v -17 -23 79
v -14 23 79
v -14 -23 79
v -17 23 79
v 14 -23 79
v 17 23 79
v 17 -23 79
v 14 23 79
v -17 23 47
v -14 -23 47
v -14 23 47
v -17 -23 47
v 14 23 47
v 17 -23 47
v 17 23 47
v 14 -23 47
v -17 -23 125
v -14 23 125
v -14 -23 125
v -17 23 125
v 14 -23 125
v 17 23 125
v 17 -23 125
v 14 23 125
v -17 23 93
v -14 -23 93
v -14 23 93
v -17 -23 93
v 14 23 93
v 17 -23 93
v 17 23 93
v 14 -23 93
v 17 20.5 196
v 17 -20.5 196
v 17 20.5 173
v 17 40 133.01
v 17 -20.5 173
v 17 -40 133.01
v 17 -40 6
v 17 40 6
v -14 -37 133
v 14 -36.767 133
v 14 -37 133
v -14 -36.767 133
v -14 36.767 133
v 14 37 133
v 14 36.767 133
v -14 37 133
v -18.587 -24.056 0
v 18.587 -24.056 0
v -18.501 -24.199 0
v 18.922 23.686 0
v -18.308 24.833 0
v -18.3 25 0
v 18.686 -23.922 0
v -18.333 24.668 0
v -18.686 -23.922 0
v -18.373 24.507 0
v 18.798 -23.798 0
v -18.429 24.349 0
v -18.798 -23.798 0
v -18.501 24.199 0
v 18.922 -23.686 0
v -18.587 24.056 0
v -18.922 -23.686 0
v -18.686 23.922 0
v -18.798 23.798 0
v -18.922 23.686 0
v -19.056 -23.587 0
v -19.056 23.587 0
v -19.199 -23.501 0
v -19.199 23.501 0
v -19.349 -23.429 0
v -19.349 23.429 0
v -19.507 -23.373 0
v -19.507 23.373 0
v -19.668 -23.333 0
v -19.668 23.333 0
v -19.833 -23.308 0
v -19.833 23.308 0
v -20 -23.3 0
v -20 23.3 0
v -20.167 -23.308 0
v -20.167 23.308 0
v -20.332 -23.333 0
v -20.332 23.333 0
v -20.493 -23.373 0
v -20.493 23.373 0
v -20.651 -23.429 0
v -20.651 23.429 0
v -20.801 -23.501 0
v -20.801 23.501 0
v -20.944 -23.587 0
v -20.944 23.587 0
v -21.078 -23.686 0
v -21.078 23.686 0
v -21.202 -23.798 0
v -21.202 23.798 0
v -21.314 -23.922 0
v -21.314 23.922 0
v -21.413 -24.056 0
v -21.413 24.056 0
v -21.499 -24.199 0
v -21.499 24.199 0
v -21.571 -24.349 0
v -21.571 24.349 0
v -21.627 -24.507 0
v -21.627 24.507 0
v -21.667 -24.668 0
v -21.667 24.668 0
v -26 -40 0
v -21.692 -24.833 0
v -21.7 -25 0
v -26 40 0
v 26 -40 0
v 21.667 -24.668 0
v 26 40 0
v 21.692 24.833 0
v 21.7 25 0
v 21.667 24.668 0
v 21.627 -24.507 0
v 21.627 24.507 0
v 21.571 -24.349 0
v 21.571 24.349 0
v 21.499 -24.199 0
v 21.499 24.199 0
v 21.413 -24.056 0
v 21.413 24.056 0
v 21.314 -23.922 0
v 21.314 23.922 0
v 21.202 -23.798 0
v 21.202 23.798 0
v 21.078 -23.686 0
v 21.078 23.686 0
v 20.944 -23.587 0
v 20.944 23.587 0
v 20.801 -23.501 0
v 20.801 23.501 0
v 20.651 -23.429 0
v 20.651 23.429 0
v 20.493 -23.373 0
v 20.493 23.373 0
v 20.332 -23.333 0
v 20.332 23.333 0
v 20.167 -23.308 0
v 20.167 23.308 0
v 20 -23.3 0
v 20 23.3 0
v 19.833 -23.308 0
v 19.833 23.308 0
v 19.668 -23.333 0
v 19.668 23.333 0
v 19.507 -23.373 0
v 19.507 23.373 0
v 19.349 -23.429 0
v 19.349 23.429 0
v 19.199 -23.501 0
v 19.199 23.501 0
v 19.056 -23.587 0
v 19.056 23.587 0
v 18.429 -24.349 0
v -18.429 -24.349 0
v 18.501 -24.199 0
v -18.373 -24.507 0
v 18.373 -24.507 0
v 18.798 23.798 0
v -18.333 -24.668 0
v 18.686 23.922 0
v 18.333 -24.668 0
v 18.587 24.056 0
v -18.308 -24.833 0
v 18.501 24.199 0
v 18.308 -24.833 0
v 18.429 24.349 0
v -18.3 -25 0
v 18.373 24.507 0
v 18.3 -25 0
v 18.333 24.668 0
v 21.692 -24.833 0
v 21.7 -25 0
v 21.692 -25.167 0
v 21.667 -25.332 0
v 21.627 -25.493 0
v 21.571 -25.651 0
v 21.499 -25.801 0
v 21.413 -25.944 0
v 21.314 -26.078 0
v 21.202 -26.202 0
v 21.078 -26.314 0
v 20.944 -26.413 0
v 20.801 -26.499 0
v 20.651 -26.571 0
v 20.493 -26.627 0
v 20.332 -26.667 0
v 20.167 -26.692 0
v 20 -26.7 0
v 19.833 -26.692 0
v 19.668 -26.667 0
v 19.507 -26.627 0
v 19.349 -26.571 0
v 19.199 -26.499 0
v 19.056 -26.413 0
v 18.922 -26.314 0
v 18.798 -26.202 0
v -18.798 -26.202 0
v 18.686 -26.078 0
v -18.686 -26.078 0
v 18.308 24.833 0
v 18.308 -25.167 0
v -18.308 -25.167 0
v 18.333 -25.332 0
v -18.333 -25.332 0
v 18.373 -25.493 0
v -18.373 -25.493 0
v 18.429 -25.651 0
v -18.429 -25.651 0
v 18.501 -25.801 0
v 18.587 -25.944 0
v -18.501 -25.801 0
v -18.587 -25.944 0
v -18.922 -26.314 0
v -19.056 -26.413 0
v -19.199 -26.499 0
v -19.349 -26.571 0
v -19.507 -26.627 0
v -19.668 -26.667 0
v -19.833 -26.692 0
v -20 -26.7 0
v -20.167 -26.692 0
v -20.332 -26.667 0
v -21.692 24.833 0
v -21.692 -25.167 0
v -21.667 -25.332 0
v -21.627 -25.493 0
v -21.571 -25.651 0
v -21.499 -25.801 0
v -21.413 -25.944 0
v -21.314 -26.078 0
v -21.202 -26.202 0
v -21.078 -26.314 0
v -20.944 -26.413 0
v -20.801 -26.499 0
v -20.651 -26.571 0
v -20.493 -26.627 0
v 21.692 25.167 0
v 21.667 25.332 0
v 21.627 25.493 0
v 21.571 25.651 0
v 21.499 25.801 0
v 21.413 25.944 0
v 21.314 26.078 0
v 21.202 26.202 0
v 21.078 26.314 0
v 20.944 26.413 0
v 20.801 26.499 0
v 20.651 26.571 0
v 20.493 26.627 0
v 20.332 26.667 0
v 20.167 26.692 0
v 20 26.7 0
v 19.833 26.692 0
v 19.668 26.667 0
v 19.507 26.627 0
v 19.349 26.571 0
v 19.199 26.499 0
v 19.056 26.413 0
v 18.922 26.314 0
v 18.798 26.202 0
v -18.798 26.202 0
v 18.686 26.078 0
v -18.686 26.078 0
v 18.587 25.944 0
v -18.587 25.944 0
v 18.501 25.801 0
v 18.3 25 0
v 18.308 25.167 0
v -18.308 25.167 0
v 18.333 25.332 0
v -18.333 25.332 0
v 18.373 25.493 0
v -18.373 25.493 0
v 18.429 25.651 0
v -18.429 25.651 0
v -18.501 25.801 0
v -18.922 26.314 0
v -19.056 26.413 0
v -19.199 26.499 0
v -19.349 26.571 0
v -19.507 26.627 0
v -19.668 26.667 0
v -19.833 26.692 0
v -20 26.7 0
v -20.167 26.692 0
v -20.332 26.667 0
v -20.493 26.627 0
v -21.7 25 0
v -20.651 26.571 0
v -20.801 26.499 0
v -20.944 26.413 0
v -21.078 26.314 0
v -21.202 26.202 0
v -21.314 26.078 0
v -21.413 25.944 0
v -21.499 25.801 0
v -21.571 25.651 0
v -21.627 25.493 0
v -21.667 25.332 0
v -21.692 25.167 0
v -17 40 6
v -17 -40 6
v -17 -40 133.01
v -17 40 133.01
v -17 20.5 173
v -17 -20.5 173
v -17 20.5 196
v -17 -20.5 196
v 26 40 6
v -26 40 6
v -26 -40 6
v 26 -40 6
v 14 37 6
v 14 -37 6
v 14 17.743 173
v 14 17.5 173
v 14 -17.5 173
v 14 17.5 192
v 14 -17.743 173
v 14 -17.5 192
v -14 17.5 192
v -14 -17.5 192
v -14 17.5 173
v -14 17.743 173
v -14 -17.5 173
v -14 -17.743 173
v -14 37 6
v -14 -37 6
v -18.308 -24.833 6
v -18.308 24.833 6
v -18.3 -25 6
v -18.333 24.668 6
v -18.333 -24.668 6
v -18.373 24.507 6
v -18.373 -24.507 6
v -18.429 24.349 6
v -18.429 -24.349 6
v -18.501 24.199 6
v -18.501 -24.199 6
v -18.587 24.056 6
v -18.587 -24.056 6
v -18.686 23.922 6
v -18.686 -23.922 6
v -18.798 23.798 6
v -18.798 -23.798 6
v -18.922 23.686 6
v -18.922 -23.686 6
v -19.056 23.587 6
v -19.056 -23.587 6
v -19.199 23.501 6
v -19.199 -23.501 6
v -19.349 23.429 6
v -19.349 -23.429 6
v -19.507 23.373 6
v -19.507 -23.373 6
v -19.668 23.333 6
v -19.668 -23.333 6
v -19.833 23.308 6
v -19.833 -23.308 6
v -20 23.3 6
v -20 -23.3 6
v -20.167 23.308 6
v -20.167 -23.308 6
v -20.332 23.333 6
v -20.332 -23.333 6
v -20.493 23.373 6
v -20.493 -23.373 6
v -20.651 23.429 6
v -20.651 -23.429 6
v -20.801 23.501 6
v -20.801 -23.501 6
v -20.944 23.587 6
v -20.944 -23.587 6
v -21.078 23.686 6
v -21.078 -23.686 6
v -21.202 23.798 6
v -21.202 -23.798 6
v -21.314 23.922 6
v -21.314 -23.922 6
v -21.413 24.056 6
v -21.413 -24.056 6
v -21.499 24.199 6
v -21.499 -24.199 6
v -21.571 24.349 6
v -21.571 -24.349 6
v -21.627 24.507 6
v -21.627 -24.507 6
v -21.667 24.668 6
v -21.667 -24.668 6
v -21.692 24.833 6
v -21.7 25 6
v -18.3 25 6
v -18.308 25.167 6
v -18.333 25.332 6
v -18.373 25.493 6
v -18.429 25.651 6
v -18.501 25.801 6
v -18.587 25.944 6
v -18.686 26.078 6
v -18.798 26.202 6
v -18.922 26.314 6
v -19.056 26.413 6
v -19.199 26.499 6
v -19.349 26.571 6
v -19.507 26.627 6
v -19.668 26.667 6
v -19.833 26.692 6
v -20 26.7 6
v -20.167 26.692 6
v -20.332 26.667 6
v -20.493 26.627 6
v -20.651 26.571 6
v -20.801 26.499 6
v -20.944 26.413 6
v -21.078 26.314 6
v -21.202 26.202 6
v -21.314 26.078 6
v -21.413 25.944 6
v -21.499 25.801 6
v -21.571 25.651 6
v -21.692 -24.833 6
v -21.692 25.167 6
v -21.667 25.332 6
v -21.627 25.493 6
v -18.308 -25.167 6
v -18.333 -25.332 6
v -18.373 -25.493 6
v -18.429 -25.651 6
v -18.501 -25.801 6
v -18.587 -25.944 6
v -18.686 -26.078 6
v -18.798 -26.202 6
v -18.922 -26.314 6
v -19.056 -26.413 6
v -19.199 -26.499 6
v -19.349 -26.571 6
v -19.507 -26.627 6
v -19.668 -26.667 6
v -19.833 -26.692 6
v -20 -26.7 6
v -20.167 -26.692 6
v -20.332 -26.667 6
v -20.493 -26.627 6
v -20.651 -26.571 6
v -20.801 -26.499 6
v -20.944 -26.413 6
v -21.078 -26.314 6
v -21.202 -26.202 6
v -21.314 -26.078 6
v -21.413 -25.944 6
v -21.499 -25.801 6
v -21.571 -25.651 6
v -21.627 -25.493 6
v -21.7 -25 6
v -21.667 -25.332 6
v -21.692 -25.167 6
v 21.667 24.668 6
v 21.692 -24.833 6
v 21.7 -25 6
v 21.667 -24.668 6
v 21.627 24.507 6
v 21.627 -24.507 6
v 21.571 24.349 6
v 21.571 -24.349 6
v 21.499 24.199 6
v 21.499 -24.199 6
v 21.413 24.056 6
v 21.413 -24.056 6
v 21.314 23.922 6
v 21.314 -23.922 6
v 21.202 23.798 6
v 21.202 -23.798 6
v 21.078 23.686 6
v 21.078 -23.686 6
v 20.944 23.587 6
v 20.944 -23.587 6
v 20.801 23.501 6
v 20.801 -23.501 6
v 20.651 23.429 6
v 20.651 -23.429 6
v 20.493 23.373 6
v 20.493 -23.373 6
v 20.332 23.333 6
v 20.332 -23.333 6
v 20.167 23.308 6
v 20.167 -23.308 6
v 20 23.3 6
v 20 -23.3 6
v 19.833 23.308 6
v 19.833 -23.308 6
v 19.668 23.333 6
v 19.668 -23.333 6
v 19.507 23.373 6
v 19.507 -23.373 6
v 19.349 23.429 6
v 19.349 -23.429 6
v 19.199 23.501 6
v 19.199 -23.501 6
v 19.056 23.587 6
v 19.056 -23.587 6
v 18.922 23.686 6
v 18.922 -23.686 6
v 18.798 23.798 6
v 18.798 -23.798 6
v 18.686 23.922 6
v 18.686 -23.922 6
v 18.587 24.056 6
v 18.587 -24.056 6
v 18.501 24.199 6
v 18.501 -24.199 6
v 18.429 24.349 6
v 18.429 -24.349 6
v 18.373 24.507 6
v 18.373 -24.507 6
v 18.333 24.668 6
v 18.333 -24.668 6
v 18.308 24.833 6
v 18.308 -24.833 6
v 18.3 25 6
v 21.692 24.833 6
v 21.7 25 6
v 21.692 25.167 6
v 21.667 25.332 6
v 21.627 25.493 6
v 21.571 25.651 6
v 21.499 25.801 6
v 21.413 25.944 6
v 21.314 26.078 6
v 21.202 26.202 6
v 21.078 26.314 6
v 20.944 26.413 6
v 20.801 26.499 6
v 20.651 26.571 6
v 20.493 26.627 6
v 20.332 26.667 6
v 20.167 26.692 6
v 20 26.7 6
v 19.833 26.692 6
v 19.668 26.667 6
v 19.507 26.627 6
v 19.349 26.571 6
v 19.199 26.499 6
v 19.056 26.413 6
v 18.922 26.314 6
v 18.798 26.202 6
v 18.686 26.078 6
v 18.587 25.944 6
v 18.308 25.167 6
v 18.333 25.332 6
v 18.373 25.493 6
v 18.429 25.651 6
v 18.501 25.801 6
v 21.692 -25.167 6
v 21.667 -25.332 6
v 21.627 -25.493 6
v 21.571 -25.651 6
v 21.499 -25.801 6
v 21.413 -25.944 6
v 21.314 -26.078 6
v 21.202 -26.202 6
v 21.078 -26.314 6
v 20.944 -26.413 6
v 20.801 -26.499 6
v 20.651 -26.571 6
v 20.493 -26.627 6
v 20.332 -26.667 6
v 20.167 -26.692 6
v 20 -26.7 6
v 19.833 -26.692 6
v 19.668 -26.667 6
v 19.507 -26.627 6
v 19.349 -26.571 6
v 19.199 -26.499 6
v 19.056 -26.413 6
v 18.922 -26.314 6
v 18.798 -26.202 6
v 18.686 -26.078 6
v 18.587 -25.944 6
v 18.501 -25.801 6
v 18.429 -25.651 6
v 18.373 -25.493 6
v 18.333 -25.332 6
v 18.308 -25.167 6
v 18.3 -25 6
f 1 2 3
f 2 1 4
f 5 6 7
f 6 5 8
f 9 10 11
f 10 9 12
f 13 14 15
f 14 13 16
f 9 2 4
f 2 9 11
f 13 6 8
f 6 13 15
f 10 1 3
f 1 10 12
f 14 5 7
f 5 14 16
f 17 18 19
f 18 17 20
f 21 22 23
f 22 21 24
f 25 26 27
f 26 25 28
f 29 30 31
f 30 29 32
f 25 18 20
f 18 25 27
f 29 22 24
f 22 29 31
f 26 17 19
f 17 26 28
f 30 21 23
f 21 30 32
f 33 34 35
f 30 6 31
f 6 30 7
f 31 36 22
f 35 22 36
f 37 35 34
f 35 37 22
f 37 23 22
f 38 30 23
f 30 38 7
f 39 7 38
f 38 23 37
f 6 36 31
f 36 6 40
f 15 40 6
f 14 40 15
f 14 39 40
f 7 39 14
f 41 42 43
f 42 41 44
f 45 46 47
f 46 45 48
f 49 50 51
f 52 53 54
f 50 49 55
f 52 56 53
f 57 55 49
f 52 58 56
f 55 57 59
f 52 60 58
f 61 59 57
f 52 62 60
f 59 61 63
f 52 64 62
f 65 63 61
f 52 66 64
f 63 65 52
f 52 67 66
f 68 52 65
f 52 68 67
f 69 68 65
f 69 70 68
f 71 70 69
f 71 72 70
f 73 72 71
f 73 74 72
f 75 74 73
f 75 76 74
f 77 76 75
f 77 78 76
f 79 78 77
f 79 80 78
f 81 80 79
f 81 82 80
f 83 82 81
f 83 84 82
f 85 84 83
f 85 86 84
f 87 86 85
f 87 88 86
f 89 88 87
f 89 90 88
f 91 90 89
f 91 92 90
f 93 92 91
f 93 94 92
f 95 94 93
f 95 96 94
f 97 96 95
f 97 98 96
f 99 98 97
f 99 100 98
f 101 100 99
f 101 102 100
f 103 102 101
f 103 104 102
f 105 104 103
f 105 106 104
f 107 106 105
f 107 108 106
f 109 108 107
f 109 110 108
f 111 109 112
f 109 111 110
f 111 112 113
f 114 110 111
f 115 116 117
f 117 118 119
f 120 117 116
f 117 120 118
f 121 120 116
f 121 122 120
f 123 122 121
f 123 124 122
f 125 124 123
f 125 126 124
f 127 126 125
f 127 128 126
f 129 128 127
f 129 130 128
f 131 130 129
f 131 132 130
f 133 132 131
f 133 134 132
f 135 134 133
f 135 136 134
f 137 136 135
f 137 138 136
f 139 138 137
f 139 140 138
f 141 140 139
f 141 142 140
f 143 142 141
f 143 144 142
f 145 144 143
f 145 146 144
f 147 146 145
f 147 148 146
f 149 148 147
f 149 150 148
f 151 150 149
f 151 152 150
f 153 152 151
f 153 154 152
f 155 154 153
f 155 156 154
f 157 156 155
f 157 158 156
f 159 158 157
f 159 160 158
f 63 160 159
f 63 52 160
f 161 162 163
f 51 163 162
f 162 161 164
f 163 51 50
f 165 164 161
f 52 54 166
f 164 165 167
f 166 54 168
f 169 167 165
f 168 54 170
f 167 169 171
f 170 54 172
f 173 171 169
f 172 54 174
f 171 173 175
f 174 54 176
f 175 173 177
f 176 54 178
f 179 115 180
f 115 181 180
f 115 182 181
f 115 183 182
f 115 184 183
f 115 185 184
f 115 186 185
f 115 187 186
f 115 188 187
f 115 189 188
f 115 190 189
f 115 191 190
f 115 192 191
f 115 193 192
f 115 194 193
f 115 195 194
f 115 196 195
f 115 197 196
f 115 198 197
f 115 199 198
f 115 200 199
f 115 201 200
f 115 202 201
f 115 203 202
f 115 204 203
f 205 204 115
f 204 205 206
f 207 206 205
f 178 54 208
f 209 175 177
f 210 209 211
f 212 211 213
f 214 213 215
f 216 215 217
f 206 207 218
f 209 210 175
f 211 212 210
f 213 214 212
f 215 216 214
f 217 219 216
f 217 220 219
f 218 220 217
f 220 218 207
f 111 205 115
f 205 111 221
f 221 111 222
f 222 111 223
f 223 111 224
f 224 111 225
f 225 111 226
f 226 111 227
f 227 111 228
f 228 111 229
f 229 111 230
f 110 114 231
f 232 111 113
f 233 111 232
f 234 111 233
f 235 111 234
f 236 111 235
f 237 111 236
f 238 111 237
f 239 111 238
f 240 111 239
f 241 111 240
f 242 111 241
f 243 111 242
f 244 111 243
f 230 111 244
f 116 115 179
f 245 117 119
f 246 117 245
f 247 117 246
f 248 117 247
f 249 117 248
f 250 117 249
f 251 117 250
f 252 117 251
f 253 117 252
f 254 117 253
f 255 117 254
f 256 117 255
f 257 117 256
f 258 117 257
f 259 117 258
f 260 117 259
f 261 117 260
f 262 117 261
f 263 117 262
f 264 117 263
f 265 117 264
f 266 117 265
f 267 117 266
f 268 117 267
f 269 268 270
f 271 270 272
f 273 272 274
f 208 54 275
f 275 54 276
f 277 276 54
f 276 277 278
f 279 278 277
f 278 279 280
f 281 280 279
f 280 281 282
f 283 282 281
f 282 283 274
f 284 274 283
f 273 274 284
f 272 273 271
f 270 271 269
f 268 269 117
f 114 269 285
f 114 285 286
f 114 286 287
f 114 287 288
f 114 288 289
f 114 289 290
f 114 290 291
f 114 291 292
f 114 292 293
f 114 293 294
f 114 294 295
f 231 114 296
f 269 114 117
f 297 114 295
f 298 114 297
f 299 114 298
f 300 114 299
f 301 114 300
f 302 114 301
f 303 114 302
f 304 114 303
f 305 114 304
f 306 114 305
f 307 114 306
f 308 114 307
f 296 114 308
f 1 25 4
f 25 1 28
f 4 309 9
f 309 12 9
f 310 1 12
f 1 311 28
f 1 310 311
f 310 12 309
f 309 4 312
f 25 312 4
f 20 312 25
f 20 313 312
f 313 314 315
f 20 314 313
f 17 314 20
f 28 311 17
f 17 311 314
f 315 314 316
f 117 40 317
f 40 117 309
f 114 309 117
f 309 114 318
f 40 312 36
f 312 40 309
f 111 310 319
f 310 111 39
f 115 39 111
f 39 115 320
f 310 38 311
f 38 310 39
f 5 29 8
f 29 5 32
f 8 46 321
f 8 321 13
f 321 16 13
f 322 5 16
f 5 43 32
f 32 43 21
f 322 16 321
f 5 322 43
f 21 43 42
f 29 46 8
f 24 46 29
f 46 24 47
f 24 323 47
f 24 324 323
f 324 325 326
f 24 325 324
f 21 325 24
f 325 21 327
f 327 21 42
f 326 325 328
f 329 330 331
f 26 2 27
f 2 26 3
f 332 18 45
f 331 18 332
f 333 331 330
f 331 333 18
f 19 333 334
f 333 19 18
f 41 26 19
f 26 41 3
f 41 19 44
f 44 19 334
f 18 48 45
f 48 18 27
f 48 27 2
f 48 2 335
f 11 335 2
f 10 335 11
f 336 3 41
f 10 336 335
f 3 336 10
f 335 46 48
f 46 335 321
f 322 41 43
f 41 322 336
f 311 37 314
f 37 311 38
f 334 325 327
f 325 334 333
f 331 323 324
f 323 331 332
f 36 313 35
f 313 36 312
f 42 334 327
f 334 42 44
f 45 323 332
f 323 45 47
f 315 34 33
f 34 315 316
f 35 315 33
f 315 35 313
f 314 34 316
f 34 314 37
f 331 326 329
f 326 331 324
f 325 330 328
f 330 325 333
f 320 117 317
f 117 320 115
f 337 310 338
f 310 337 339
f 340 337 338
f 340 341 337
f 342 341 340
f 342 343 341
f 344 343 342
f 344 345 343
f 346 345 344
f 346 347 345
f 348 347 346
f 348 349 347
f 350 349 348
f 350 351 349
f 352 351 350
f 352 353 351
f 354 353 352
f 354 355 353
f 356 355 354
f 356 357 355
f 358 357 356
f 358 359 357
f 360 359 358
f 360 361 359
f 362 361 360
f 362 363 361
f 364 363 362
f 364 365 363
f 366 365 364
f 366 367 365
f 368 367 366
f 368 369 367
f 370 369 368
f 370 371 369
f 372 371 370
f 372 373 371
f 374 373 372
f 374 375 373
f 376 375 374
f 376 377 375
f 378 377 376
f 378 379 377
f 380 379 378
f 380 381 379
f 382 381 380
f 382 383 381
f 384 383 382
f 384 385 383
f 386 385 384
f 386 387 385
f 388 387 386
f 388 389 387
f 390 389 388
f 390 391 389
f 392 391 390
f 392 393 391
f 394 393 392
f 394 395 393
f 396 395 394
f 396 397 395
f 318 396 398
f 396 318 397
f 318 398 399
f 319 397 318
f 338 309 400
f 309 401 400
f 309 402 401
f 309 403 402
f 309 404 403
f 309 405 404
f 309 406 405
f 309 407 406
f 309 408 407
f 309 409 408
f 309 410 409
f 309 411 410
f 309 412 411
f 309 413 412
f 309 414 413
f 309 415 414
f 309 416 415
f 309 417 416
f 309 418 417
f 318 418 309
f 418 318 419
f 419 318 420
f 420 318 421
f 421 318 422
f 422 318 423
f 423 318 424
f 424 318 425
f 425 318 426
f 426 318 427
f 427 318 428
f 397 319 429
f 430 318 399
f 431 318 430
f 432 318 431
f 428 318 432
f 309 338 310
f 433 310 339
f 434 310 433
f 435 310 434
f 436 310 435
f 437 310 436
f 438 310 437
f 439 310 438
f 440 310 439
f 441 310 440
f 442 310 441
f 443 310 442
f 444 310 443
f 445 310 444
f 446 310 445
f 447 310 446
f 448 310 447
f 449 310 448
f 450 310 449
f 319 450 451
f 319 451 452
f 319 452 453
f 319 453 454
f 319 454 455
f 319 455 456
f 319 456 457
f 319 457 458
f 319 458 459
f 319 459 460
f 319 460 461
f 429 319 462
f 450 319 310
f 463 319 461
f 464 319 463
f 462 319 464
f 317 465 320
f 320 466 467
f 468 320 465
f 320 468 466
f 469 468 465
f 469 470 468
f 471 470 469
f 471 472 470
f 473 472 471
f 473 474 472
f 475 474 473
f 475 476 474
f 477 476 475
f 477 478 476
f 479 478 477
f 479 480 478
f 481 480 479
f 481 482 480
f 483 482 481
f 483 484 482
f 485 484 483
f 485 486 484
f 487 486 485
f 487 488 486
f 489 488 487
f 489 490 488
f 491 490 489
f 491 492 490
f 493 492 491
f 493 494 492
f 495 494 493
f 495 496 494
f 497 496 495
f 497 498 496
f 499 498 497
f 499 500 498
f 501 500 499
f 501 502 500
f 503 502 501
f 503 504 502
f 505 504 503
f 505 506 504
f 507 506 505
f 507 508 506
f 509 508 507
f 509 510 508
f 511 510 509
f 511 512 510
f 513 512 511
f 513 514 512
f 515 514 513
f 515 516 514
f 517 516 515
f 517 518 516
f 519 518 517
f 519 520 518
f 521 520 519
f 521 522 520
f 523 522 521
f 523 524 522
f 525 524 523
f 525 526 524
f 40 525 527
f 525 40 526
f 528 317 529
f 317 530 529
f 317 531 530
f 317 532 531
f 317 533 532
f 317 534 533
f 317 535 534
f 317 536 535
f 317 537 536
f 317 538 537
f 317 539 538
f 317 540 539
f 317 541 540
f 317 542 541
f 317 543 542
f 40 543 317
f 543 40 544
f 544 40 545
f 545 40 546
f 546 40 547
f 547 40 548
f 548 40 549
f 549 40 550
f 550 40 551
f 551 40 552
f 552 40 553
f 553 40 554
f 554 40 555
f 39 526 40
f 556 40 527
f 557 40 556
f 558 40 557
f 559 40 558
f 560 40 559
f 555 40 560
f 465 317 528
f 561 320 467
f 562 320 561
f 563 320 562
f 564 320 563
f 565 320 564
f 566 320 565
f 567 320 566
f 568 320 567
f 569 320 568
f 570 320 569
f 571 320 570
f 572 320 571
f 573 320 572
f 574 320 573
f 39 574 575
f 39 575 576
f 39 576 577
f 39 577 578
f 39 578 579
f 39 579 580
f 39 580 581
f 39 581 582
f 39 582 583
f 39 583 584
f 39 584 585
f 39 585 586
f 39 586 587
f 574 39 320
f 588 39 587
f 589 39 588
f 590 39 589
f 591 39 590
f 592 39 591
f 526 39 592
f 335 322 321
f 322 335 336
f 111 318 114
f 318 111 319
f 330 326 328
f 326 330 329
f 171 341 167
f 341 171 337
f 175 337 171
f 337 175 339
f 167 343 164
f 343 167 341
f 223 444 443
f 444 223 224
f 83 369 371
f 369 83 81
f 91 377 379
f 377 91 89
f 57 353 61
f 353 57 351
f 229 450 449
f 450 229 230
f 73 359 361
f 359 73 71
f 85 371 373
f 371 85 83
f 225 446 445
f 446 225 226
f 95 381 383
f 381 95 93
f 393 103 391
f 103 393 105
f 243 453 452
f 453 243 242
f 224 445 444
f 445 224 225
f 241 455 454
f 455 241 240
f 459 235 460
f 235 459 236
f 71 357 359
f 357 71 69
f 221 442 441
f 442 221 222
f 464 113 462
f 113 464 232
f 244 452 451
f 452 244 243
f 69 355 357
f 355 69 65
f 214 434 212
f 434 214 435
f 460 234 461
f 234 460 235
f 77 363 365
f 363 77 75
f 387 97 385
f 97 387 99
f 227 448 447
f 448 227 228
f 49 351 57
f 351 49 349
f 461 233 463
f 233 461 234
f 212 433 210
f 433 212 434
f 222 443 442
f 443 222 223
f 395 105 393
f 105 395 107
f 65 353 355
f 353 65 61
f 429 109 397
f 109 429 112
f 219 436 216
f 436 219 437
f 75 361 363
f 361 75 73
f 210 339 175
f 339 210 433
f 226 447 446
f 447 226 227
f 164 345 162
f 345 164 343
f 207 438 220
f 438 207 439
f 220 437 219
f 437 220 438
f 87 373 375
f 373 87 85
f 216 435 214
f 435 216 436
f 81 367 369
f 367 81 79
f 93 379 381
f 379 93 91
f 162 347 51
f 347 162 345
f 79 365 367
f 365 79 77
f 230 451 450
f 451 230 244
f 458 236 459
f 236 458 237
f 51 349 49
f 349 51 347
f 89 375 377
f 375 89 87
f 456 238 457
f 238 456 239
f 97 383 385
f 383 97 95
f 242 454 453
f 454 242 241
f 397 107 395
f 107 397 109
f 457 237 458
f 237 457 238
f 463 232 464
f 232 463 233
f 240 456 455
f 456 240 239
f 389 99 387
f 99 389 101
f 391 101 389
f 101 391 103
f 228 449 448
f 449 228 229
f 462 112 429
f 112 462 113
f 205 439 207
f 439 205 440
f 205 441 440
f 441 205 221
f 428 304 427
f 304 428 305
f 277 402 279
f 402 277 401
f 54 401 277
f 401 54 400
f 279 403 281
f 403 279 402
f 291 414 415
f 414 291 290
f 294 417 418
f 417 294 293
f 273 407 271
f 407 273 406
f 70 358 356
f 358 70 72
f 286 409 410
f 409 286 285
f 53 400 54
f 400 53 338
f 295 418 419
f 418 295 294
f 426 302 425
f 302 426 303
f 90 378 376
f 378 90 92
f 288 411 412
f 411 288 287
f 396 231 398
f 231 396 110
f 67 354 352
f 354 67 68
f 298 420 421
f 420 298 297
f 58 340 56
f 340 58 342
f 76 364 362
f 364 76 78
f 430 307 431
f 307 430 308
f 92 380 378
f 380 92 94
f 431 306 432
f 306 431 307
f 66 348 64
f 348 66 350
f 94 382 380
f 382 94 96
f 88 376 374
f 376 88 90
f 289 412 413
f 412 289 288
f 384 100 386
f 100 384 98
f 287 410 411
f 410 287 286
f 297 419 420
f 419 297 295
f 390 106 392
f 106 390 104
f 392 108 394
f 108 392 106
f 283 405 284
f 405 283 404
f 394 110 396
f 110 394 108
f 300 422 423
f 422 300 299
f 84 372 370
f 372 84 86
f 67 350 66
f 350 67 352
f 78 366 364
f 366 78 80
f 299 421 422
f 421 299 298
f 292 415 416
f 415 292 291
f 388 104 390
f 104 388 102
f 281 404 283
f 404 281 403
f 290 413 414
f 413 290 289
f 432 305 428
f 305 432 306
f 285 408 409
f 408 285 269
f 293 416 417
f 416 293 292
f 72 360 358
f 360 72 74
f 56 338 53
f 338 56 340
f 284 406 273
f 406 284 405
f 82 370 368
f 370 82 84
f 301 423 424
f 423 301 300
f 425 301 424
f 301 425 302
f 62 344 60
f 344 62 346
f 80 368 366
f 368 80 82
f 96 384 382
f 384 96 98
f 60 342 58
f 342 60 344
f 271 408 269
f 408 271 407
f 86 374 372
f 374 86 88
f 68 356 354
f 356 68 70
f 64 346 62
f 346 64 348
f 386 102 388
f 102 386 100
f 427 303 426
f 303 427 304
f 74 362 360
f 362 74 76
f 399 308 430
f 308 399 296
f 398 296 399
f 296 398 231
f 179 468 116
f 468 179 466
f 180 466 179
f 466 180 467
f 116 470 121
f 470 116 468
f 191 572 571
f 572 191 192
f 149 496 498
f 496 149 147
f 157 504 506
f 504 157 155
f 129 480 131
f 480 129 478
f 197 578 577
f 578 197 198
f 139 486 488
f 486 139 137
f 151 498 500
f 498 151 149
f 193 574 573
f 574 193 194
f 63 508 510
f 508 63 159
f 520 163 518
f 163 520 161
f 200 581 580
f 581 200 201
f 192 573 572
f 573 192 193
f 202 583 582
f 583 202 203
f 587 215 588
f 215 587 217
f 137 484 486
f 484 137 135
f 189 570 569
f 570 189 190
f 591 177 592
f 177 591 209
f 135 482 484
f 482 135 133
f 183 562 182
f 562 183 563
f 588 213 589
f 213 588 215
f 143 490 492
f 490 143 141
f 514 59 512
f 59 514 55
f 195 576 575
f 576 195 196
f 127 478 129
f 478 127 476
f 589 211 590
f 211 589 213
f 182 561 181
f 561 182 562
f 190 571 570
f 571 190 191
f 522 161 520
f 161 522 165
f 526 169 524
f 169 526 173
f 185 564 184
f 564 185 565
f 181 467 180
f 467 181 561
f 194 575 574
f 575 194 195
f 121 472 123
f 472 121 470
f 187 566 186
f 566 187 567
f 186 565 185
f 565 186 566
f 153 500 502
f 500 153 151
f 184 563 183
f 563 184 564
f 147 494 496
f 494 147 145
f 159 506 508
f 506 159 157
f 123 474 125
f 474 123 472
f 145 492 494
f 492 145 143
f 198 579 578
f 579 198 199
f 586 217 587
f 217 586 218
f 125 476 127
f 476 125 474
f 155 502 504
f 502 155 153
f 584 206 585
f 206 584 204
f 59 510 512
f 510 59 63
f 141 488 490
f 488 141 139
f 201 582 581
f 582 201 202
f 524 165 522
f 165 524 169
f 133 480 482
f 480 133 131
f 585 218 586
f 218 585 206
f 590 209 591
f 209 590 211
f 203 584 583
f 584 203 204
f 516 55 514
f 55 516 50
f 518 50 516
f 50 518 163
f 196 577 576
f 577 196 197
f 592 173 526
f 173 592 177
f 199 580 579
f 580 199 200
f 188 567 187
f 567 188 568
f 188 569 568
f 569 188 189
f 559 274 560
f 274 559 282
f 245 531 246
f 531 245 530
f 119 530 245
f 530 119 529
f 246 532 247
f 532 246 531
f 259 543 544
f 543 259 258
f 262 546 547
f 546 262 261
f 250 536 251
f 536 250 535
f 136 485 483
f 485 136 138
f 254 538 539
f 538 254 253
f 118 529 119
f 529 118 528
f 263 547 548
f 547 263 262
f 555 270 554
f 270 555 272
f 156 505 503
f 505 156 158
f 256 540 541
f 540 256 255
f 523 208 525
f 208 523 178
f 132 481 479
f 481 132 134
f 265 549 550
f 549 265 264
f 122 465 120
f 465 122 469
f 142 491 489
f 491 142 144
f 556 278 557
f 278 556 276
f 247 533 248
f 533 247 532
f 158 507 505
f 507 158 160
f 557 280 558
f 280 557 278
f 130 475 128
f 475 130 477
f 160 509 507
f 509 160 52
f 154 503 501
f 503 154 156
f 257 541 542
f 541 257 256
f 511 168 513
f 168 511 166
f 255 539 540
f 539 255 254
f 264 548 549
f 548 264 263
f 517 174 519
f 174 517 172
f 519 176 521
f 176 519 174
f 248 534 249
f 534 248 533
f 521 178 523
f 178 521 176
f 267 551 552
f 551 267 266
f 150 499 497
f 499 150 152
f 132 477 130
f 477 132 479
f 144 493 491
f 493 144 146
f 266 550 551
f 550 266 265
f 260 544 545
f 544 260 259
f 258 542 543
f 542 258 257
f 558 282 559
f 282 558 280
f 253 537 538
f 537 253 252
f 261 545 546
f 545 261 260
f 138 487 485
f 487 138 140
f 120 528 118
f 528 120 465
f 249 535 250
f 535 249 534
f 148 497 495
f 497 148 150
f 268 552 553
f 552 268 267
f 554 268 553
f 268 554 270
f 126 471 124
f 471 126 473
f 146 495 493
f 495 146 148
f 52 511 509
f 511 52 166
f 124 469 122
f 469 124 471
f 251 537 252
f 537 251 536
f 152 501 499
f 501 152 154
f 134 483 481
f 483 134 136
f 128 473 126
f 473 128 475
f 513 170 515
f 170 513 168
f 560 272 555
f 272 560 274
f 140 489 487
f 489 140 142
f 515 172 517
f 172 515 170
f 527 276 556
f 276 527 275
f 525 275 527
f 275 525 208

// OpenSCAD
// Standalone robot lower spine part.
// v5: reprint needed - the carrier boss grew 40 -> 44, so the flange
// height (lsp_z0) moved up 2 mm with it.
// Edit shared dimensions in frame_v5.scad so the assembly stays linked.

part_mode = "lower_spine";
part_cutaway = false;
print_export = true;

include <frame_master.scad>
